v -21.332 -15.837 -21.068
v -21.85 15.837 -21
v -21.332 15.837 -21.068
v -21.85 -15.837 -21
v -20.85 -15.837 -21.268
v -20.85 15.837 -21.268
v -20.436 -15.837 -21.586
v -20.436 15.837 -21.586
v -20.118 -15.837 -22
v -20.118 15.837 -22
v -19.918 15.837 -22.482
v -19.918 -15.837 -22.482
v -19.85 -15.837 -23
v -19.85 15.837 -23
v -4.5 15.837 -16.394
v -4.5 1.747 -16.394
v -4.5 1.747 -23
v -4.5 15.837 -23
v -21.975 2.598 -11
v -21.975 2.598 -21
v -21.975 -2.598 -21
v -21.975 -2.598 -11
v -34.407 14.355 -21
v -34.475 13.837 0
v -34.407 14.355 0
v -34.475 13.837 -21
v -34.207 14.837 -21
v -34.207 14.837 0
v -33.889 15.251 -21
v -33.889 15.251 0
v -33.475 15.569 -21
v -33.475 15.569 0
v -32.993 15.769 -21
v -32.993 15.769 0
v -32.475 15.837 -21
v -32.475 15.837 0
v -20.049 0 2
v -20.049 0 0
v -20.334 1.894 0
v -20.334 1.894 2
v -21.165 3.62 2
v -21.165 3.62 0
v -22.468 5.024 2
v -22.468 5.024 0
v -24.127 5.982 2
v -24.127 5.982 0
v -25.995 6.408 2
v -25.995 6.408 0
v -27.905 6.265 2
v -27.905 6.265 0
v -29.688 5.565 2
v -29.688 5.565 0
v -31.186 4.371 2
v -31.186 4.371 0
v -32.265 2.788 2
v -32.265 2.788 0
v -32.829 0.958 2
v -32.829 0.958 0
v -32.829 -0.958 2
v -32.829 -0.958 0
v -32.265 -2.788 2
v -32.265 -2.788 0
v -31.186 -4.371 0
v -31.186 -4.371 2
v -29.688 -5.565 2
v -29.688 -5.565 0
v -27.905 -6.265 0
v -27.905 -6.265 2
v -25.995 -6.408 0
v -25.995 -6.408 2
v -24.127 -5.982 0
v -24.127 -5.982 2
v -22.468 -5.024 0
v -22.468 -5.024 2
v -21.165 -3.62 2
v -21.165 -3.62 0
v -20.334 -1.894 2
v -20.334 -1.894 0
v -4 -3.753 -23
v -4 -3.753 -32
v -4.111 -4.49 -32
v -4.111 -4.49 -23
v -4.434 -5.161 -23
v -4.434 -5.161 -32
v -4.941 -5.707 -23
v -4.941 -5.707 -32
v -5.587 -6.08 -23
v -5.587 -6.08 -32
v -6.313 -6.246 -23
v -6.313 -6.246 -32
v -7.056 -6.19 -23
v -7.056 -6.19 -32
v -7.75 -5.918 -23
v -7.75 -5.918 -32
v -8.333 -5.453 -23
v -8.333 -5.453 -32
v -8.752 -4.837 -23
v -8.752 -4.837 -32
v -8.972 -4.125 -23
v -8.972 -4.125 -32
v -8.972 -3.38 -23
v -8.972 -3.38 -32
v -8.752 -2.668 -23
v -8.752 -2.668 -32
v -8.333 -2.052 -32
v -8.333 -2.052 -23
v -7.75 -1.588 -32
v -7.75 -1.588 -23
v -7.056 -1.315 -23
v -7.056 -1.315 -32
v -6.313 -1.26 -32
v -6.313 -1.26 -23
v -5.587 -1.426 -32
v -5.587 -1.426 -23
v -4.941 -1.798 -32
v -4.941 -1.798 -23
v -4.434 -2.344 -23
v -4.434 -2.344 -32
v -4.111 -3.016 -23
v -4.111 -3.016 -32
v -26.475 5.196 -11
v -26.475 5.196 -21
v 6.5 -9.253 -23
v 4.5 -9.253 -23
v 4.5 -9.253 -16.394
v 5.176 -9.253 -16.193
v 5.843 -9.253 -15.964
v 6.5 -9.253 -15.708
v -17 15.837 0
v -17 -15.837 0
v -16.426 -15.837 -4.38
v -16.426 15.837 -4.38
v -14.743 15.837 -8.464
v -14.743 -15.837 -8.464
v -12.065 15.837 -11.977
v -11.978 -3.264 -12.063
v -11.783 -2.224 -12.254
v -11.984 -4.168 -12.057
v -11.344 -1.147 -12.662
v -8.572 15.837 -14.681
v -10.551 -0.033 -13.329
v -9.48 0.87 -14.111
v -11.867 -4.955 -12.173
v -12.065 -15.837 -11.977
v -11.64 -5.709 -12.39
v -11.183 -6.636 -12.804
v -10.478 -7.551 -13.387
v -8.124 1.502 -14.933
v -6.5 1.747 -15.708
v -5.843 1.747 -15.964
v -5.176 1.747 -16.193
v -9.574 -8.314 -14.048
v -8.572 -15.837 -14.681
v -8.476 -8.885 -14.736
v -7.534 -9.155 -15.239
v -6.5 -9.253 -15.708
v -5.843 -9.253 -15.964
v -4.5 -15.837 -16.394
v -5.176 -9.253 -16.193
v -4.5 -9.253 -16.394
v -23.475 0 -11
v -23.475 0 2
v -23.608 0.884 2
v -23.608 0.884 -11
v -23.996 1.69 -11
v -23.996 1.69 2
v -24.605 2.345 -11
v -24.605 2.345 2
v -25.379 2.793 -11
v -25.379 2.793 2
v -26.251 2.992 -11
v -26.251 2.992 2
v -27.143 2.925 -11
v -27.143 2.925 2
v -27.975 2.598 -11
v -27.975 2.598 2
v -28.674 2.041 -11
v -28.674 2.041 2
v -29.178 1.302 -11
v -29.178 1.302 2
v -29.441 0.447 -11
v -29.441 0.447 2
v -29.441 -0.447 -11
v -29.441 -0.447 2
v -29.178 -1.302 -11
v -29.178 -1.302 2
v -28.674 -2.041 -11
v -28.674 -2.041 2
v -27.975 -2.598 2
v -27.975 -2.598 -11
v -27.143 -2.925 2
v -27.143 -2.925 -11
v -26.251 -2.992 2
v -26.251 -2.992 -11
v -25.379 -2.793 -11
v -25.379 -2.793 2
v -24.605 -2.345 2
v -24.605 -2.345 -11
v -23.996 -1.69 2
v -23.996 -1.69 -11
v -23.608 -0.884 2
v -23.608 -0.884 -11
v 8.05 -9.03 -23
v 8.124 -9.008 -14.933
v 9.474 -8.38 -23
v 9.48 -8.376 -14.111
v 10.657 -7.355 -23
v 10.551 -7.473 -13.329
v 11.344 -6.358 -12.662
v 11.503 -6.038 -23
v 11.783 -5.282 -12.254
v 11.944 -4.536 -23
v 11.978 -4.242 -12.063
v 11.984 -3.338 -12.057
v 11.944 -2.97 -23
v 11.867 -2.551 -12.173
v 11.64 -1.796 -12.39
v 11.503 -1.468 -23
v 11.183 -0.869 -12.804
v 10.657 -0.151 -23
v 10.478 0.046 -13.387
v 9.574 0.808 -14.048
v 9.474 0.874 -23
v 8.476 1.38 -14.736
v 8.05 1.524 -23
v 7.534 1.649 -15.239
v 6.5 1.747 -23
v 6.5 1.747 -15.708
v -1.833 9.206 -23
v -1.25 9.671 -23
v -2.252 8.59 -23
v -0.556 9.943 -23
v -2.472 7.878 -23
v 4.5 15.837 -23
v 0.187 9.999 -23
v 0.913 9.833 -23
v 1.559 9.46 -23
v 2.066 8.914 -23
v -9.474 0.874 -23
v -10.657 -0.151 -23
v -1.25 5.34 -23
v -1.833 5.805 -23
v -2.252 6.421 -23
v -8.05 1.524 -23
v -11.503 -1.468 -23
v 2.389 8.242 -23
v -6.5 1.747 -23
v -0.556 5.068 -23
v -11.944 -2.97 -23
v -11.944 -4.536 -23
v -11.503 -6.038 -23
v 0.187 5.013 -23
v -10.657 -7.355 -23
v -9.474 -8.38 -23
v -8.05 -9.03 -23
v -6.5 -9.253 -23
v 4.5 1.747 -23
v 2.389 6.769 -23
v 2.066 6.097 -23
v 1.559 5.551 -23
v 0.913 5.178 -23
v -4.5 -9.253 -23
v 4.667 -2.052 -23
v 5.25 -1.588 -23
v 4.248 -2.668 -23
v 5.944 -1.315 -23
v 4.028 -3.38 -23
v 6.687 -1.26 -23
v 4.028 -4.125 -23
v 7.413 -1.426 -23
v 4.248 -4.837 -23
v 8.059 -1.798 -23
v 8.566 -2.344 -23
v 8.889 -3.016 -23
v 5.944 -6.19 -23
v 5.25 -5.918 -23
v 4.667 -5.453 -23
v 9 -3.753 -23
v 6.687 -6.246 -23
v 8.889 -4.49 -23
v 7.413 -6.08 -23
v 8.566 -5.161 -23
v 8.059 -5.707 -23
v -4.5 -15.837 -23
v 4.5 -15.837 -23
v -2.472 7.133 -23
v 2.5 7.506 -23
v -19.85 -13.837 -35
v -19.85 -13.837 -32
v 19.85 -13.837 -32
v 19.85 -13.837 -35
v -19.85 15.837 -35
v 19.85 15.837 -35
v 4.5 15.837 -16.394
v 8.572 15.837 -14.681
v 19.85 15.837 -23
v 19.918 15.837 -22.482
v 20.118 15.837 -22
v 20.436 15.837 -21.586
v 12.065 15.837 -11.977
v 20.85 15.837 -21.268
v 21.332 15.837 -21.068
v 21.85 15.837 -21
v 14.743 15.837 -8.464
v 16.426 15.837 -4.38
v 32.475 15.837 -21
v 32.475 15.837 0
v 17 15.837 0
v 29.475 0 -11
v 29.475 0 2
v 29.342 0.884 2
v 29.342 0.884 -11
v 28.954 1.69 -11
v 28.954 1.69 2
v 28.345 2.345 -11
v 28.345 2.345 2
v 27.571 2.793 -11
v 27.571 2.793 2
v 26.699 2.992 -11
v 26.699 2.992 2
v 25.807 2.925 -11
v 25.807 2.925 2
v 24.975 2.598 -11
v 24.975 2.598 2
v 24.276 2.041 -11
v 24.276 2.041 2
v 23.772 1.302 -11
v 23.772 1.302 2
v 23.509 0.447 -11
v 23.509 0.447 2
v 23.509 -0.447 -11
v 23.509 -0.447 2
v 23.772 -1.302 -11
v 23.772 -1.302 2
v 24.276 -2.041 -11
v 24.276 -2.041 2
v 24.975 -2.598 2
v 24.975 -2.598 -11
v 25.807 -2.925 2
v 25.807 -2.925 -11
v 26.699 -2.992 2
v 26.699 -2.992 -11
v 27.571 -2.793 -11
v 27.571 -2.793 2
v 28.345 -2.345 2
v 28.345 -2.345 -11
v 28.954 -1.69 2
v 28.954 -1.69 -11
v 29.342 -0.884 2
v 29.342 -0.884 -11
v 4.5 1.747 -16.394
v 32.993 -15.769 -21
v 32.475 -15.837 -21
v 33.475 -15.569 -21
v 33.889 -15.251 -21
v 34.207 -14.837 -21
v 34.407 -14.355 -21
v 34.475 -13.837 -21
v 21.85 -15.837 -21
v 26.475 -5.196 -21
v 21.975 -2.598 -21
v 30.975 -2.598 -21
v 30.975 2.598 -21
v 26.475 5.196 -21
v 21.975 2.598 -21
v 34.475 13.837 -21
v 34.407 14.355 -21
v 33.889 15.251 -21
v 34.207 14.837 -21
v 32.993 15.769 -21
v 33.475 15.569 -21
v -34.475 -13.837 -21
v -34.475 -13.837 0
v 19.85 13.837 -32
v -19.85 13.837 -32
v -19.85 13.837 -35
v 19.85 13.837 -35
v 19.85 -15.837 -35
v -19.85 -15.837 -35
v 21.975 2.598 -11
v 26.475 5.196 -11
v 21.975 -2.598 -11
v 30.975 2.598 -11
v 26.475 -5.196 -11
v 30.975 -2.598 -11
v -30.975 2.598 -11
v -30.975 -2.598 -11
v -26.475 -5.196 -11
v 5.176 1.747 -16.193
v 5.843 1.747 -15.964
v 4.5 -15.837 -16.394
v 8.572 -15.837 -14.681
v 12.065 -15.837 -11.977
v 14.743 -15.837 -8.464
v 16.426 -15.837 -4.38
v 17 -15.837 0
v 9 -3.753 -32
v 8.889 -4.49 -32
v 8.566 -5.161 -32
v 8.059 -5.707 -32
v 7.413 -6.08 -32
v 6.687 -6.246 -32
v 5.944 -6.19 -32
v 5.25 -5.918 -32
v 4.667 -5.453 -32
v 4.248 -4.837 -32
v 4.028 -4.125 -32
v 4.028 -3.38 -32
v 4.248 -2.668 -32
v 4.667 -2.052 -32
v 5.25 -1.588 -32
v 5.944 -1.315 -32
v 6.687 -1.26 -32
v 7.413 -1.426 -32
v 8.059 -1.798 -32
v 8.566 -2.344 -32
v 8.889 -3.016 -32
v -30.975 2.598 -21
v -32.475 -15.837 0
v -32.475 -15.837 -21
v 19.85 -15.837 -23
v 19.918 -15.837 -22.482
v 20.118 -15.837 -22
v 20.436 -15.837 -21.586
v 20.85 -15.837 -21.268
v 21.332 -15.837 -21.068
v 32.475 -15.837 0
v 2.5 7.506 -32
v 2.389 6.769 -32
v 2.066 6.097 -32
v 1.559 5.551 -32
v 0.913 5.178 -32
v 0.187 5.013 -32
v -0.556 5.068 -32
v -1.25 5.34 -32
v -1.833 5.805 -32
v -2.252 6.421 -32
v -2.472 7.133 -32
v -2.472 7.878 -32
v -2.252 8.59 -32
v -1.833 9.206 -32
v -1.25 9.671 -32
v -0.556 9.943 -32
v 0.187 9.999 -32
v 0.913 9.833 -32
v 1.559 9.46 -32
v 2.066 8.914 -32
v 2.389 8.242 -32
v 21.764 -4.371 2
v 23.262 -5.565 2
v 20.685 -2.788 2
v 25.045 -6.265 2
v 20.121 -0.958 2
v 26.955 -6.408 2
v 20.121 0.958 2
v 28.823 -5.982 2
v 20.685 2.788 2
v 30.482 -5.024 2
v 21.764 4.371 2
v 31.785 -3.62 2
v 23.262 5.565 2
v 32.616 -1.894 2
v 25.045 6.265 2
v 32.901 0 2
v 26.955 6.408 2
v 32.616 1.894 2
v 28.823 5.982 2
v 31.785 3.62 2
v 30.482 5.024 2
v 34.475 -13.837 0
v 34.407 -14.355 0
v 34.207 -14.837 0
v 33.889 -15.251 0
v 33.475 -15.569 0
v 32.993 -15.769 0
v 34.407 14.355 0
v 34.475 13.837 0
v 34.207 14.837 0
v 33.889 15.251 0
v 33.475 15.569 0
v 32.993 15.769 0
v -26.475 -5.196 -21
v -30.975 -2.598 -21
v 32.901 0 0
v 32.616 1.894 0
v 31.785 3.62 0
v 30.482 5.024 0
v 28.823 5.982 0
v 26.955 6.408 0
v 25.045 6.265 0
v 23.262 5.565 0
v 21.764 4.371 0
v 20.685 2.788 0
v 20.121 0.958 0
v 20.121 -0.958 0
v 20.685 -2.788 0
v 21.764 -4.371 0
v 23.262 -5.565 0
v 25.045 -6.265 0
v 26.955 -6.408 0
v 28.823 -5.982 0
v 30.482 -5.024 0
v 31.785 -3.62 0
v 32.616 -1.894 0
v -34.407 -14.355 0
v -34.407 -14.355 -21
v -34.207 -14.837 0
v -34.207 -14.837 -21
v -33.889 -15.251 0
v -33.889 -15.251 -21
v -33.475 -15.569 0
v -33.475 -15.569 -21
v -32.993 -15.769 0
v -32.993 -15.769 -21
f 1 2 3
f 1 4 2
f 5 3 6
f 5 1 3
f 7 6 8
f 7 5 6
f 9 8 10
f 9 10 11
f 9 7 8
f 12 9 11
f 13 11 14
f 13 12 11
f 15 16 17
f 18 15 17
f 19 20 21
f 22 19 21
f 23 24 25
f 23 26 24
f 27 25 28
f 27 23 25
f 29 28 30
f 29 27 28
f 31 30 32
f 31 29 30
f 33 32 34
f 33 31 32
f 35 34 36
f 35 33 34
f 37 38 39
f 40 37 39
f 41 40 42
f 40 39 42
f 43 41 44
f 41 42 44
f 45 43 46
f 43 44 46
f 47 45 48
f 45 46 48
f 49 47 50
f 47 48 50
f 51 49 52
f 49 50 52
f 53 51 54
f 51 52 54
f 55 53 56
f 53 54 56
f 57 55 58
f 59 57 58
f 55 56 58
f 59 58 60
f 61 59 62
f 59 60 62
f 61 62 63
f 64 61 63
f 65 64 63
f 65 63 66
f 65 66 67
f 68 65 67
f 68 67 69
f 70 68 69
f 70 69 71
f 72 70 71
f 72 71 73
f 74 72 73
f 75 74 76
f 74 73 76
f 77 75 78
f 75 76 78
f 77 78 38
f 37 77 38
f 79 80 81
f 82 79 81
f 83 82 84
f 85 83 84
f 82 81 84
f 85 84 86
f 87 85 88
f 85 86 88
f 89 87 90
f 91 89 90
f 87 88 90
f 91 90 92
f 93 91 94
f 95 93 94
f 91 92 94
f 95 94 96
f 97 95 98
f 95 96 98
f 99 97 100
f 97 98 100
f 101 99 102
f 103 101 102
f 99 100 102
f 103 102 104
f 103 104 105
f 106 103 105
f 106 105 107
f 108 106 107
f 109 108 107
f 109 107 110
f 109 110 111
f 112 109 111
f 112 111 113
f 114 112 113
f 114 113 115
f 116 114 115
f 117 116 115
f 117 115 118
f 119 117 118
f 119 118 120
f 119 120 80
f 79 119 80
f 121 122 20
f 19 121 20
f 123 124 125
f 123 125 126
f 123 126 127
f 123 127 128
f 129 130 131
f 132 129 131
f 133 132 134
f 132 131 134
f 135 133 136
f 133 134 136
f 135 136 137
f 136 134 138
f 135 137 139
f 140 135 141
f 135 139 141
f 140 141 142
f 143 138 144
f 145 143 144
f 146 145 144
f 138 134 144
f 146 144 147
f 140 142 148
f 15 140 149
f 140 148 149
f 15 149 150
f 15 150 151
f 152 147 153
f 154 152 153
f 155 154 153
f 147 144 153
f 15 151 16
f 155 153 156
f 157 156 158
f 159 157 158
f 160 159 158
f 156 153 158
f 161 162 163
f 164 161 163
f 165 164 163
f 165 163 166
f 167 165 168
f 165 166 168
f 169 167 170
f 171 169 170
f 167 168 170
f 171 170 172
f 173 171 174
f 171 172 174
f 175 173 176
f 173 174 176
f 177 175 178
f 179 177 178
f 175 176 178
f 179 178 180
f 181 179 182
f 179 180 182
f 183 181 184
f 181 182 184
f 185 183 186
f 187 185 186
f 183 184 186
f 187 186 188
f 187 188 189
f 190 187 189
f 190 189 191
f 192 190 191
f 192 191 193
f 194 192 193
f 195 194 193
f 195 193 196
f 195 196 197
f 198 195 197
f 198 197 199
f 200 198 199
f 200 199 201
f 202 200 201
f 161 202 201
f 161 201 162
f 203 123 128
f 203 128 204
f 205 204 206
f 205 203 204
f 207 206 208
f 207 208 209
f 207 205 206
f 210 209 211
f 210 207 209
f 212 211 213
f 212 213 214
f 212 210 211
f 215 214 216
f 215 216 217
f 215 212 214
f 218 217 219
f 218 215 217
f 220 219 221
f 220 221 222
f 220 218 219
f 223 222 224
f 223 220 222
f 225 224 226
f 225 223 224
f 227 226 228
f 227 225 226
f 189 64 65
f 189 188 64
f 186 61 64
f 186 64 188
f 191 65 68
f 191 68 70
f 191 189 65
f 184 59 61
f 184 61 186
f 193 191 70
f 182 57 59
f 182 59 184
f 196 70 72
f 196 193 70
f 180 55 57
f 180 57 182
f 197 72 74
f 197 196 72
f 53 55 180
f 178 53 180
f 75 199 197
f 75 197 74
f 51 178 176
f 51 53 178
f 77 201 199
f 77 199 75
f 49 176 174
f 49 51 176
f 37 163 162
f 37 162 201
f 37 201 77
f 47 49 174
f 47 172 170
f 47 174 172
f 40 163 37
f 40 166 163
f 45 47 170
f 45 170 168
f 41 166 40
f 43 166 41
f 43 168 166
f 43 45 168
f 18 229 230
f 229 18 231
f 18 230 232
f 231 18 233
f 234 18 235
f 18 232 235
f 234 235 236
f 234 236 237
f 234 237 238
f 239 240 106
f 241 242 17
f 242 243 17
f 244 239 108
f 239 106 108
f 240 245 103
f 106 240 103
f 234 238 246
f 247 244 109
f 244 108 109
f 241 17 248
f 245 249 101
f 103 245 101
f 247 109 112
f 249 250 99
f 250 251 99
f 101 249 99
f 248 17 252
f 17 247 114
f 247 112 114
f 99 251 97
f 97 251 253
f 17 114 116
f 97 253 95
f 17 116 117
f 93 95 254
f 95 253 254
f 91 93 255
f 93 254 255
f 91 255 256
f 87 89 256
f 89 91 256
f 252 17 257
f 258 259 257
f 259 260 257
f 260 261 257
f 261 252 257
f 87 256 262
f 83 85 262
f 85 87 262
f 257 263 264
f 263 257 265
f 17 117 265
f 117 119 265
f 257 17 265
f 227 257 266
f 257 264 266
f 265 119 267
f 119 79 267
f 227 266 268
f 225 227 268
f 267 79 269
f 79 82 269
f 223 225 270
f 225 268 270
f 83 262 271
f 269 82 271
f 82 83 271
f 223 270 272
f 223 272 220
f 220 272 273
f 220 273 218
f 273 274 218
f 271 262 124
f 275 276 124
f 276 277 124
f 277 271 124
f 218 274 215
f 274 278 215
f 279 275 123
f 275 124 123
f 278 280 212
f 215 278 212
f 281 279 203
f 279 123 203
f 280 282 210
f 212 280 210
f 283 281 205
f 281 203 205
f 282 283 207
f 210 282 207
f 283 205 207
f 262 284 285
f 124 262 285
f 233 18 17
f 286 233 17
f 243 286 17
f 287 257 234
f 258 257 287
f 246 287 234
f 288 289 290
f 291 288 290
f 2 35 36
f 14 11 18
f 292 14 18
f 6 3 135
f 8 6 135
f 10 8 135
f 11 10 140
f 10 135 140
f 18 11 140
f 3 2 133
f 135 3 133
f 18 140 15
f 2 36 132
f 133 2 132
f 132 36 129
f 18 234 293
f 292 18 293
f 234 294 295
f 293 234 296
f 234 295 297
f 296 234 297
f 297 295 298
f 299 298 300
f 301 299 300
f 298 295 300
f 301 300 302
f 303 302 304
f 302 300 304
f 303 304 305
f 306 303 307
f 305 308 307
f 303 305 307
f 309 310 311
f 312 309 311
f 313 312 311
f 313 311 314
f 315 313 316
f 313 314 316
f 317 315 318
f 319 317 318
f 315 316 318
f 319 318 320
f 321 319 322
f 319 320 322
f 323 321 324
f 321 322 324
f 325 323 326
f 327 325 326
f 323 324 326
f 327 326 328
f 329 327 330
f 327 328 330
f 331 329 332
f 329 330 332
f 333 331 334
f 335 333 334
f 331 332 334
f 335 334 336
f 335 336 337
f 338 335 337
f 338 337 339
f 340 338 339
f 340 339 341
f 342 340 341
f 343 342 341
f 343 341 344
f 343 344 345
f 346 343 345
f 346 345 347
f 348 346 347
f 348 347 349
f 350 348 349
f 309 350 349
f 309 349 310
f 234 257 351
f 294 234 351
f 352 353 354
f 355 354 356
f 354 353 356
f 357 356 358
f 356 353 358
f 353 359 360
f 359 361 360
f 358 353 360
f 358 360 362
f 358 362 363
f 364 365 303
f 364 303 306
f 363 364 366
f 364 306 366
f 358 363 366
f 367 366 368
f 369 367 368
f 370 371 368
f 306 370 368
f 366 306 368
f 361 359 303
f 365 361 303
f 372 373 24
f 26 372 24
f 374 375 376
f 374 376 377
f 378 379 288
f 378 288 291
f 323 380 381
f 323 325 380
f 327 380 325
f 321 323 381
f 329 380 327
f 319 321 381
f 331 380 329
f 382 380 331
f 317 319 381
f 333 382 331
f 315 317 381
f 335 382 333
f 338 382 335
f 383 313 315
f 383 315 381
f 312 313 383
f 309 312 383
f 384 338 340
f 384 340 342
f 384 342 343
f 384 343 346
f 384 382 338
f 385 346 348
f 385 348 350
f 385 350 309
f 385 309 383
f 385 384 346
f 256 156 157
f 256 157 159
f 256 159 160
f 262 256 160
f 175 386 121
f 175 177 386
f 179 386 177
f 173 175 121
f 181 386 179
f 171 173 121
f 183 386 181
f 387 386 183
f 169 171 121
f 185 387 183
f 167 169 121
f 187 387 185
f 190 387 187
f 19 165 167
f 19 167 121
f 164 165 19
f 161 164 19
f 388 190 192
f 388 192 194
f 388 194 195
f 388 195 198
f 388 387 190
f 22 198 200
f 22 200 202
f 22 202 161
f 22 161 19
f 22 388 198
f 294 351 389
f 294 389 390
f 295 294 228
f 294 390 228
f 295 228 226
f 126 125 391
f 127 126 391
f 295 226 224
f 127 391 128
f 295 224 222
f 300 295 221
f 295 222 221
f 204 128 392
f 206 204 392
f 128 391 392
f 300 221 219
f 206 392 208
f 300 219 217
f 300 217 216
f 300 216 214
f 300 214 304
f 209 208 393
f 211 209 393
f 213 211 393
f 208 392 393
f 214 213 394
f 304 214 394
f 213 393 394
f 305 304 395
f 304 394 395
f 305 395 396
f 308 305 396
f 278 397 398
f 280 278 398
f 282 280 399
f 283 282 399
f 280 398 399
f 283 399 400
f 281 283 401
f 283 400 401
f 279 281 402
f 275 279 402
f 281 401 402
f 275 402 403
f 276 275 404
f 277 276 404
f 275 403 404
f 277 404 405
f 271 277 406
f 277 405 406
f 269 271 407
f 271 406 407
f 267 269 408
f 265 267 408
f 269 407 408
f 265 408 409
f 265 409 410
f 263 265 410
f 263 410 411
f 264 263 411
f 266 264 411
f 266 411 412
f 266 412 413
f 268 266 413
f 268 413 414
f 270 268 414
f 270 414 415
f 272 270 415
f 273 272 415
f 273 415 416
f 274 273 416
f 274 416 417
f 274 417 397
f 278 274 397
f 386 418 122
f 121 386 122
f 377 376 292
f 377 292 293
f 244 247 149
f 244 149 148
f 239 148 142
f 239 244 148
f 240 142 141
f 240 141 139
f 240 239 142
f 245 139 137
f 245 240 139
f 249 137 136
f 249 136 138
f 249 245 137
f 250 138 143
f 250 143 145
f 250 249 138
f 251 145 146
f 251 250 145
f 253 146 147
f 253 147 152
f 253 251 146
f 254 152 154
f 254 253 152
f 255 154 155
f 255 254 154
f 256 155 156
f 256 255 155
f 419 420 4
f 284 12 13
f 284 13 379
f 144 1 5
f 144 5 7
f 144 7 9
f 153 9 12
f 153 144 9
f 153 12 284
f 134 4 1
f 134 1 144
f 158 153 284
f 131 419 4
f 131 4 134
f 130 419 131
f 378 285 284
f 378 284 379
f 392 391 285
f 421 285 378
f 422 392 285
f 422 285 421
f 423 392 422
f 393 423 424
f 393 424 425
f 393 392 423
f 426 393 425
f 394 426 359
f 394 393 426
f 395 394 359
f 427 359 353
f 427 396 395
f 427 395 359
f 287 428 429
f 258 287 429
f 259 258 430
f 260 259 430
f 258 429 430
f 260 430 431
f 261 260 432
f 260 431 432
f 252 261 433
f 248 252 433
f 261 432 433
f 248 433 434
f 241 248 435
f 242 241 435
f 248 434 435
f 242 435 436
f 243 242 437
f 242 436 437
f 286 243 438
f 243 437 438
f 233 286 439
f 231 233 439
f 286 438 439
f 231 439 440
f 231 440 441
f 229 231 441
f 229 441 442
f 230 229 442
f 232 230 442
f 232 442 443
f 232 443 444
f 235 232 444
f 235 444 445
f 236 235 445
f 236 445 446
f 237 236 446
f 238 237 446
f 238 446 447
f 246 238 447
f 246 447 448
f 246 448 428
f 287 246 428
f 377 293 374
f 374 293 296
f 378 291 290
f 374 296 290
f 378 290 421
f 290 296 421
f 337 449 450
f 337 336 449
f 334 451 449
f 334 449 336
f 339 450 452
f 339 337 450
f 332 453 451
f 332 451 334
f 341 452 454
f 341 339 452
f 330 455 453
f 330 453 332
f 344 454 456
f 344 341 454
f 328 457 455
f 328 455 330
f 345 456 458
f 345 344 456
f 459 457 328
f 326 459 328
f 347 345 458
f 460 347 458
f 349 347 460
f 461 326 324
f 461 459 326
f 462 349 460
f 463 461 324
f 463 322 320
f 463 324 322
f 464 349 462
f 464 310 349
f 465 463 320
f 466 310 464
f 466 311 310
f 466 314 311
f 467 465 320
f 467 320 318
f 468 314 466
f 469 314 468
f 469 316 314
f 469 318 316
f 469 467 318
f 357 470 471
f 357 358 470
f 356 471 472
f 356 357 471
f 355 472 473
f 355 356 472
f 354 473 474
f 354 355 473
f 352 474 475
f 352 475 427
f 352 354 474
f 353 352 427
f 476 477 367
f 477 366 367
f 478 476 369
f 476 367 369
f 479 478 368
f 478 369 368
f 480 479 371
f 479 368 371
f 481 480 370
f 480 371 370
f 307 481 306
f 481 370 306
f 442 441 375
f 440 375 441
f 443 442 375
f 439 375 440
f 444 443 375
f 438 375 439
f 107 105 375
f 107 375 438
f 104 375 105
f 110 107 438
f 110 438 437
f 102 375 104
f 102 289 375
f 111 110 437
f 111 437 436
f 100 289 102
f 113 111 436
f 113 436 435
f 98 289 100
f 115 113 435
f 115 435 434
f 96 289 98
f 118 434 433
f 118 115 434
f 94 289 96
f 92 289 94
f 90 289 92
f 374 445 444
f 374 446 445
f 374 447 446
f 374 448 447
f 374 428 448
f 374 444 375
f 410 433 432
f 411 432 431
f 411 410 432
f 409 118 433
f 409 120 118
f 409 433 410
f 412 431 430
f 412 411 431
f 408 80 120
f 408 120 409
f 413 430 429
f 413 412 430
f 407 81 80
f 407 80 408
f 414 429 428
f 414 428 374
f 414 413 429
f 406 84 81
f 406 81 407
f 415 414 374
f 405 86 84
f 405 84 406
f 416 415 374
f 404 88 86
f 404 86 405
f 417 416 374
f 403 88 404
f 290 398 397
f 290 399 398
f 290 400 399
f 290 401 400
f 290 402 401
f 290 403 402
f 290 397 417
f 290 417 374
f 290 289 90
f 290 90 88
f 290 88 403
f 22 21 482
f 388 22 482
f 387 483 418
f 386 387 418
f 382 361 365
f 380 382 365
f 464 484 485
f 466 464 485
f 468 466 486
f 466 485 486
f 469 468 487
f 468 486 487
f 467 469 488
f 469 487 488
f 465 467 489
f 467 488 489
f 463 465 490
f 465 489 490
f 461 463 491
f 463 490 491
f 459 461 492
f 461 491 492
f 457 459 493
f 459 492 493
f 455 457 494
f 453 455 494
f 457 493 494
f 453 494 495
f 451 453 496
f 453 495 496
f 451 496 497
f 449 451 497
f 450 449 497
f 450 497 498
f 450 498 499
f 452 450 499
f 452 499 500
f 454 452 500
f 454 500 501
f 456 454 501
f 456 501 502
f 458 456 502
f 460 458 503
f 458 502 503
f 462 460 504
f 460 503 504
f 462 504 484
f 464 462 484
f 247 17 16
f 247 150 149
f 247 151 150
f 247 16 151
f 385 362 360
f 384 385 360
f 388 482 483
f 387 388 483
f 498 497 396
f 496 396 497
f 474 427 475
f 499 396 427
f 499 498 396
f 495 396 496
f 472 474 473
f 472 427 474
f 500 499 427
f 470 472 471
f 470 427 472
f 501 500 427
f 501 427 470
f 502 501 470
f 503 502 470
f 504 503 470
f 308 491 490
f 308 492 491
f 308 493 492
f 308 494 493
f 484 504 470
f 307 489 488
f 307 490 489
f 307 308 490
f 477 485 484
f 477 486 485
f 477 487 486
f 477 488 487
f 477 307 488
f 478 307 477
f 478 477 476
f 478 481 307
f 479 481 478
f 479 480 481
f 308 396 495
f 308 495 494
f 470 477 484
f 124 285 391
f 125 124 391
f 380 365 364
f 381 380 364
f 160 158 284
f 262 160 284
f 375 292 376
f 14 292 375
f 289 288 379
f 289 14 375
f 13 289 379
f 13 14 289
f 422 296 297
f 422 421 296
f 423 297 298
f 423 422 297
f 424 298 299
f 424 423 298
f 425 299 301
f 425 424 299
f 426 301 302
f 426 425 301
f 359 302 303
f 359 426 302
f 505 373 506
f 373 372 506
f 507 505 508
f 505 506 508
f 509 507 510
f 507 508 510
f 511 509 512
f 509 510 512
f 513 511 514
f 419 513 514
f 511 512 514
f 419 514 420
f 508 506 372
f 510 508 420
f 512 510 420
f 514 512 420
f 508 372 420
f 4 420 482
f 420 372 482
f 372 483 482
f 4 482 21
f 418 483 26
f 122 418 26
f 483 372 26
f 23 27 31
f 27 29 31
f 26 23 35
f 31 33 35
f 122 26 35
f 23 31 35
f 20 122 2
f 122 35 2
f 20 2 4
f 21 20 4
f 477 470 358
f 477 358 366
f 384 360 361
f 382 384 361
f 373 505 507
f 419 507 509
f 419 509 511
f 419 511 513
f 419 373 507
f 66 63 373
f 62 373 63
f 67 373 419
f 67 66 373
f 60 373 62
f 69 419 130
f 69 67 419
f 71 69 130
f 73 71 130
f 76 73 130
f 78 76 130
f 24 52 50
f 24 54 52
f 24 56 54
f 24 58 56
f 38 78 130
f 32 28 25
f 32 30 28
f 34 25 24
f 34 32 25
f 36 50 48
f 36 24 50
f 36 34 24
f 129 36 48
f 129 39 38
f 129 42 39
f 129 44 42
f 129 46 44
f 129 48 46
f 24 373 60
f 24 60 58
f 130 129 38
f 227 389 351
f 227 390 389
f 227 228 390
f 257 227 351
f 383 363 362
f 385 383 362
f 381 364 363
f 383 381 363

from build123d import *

# Parameters (mm, degrees)
F0_W      = 68.95
F0_H      = 31.6738
F1_DEPTH  = 21
F2_W      = 39.7002
F2_H      = 31.6738
F3_DEPTH  = 11
F4_R      = 6.4262
F4_R_2    = 2.794
F5_DEPTH  = 2
F6_R      = 3
F7_DEPTH  = 34.001
F9_DEPTH  = 10
F11_DEPTH = 31.6748
F12_W     = 39.7002
F12_H     = 2
F13_DEPTH = 3
F14_R     = 2.5
F15_DEPTH = 34.001
F17_DEPTH = 25.001
F18_R     = 2
F19_R     = 2


with BuildPart() as f1:
    # F0 (on Top) → F1 (new body)
    with BuildSketch(Plane.XY):
        Rectangle(F0_W, F0_H)
    extrude(amount=-F1_DEPTH)

    # F2 (on face) → F3 (join)
    with BuildSketch(Plane(origin=(0, 0, -21), x_dir=(1, 0, 0), z_dir=(0, 0, -1))):
        Rectangle(F2_W, F2_H)
    extrude(amount=F3_DEPTH)

    # F4 (on face) → F5 (join)
    with BuildSketch(Plane.XY):
        with Locations((-26.475, 0)):
            Circle(F4_R)
        with Locations((-26.475, 0)):
            Circle(F4_R_2, mode=Mode.SUBTRACT)
        with Locations((26.475, 0)):
            Circle(F4_R)
    extrude(amount=F5_DEPTH)

    # F6 (on face) → F7 (cut, through all)
    with BuildSketch(Plane.XY.offset(2)):
        with Locations((-26.475, 0)):
            Circle(F6_R)
        with Locations((26.475, 0)):
            Circle(F6_R)
    extrude(amount=-F7_DEPTH, mode=Mode.SUBTRACT)

    # F8 (on face) → F9 (cut)
    with BuildSketch(Plane(origin=(0, 0, -21), x_dir=(1, 0, 0), z_dir=(0, 0, -1))):
        Polygon((-26.475, 5.196152), (-30.975, 2.598076), (-30.975, -2.598076), (-26.475, -5.196152), (-21.975, -2.598076), (-21.975, 2.598076), align=None)
        Polygon((26.475, -5.196152), (30.975, -2.598076), (30.975, 2.598076), (26.475, 5.196152), (21.975, 2.598076), (21.975, -2.598076), align=None)
    extrude(amount=-F9_DEPTH, mode=Mode.SUBTRACT)

    # F10 (on face) → F11 (cut, through all)
    with BuildSketch(Plane.XZ.offset(15.8369)):
        with BuildLine():
            Line((4.5, -23), (4.5, -16.393596))
            ThreePointArc((4.5, -16.393596), (13.518506, -10.307764), (17, 0))
            Line((17, 0), (-17, 0))
            ThreePointArc((-17, 0), (-13.518506, -10.307764), (-4.5, -16.393596))
            Line((-4.5, -16.393596), (-4.5, -23))
            Line((-4.5, -23), (4.5, -23))
        make_face()
    extrude(amount=-F11_DEPTH, mode=Mode.SUBTRACT)

    # F12 (on face) → F13 (join)
    with BuildSketch(Plane(origin=(0, 0, -32), x_dir=(1, 0, 0), z_dir=(0, 0, -1))):
        with Locations((0, 14.8369)):
            Rectangle(F12_W, F12_H)
        with Locations((0, -14.8369)):
            Rectangle(F12_W, F12_H)
    extrude(amount=F13_DEPTH)

    # F14 (on face) → F15 (cut, through all)
    with BuildSketch(Plane(origin=(0, 0, -32), x_dir=(1, 0, 0), z_dir=(0, 0, -1))):
        with Locations((-6.5, 3.752777)):
            Circle(F14_R)
        with Locations((6.5, 3.752777)):
            Circle(F14_R)
        with Locations((0, -7.505553)):
            Circle(F14_R)
    extrude(amount=-F15_DEPTH, mode=Mode.SUBTRACT)

    # F16 (on face) → F17 (cut, through all)
    with BuildSketch(Plane.XY.offset(-23)):
        with BuildLine():
            ThreePointArc((-6.5, 1.747223), (-12, -3.752777), (-6.5, -9.252777))
            Line((-6.5, -9.252777), (6.5, -9.252777))
            ThreePointArc((6.5, -9.252777), (12, -3.752777), (6.5, 1.747223))
            Line((6.5, 1.747223), (-6.5, 1.747223))
        make_face()
    extrude(amount=F17_DEPTH, mode=Mode.SUBTRACT)

    # F18
    f18_edges = [f1.edges().sort_by_distance(p)[0] for p in [
        (-34.475, -15.8369, -10.5),
        (34.475, -15.8369, -10.5),
        (34.475, 15.8369, -10.5),
        (-34.475, 15.8369, -10.5),
    ]]
    fillet(f18_edges, radius=F18_R)

    # F19
    f19_edges = [f1.edges().sort_by_distance(p)[0] for p in [
        (-19.8501, 0, -21),
        (19.8501, 0, -21),
    ]]
    fillet(f19_edges, radius=F19_R)


solid = f1.part
